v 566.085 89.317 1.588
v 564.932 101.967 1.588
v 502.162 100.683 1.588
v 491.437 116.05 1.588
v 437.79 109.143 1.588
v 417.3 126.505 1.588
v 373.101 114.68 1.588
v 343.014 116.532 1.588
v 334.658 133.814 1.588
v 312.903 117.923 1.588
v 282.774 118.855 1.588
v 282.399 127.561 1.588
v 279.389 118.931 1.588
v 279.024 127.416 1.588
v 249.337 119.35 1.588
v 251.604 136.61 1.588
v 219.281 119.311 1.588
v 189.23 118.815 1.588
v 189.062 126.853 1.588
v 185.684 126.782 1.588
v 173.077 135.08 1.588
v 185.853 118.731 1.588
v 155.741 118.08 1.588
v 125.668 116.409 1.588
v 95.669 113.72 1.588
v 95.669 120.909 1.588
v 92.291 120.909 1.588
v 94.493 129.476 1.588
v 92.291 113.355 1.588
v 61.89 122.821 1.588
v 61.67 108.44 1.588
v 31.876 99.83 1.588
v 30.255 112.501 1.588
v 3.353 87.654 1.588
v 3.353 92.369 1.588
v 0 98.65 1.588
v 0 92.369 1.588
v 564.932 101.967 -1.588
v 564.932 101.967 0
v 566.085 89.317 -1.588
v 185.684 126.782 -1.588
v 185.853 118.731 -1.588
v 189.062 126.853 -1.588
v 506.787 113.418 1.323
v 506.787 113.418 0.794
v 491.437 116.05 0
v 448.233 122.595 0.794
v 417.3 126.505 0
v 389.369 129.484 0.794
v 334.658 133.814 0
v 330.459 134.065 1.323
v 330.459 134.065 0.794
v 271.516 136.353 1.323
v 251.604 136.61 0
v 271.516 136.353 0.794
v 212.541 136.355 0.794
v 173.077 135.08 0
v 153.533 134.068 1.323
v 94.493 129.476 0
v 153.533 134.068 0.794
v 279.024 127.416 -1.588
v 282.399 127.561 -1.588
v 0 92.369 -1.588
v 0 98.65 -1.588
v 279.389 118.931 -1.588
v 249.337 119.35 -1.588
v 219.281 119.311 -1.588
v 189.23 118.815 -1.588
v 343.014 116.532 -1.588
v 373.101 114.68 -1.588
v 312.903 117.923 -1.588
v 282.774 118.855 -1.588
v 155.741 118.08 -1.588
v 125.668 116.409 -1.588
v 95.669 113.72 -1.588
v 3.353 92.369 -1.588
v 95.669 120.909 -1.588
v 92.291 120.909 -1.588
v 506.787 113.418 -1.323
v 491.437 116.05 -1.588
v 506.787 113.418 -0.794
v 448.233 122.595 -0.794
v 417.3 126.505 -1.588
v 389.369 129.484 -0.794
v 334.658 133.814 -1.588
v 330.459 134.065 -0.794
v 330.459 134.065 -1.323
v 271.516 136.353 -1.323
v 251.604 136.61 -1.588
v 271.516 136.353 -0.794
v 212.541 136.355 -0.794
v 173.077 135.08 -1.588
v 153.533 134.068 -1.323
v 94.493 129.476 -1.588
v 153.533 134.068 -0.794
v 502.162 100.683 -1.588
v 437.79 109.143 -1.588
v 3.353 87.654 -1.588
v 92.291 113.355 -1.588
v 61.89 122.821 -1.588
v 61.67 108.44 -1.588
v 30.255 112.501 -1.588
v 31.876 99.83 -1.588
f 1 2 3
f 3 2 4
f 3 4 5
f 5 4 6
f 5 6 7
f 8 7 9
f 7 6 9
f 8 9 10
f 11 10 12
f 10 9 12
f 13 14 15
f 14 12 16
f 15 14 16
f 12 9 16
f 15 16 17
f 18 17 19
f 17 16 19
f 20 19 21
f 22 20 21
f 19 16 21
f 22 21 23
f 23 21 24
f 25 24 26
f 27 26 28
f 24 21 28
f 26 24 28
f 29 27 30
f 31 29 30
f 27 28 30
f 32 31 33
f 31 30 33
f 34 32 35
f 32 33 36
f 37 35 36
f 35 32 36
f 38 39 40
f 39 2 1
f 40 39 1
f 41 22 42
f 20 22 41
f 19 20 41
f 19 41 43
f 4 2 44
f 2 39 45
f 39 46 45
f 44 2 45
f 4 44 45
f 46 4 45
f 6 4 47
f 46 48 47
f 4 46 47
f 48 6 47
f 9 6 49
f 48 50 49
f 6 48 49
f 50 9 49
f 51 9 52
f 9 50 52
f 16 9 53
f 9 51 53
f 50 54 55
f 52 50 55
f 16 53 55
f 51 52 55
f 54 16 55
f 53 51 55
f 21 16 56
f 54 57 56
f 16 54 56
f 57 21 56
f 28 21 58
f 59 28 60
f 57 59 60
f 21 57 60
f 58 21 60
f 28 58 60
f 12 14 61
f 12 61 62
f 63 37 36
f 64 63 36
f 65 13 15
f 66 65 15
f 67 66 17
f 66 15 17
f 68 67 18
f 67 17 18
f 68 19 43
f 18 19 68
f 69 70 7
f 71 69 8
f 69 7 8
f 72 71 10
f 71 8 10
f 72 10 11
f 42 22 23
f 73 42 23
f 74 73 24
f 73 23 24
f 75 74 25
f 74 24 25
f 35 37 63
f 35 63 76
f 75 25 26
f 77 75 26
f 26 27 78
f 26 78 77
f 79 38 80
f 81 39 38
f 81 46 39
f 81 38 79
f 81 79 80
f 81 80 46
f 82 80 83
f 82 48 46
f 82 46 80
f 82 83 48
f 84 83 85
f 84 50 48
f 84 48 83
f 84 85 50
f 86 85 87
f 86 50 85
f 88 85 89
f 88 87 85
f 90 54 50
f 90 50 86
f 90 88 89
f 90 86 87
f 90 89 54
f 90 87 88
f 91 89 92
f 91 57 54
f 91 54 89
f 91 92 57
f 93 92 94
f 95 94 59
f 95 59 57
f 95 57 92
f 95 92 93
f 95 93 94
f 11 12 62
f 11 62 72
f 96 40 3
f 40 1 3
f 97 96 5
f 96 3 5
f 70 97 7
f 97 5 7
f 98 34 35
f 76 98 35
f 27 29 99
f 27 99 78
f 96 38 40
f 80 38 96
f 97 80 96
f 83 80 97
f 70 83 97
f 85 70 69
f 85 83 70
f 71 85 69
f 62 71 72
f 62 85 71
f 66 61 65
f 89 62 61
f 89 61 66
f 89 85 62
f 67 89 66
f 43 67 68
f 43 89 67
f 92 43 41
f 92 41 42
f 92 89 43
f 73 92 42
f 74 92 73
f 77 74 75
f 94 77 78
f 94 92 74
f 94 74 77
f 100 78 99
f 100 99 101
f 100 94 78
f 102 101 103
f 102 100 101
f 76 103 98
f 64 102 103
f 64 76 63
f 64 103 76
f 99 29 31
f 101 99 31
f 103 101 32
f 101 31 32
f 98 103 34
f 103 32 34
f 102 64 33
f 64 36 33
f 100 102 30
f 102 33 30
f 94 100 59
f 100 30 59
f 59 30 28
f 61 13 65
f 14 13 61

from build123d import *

# Parameters (mm, degrees)
BOSS_EXTRUDE1_DEPTH = 1.5875
SKETCH2_W           = 3.3528
SKETCH2_H           = 6.4262
SKETCH2_W_2         = 3.3782
SKETCH2_H_2         = 12.7
CUT_EXTRUDE1_DEPTH  = 583.351362494


with BuildPart() as part:
    # Sketch1 → Boss-Extrude1 (new, symmetric)
    with BuildSketch(Plane.XY):
        with BuildLine():
            Line((0, 98.650251409), (0, 85.942482804))
            ThreePointArc((0, 85.942482804), (44.883725347, 104.075777355), (92.3925, 113.364561093))
            ThreePointArc((92.3925, 113.364561093), (139.073495573, 117.280297245), (185.895946704, 118.731643998))
            ThreePointArc((185.895946704, 118.731643998), (279.546572247, 118.92726657), (373.101055052, 114.68030529))
            ThreePointArc((373.101055052, 114.68030529), (470.024153779, 105.277769076), (566.085246422, 89.31652744))
            Line((566.085246422, 89.31652744), (564.932089986, 101.967475673))
            add(Edge.make_bspline(
                [(564.932089986, 101.967475673), (526.305455218, 110.35905311), (487.405693808, 117.234860687), (438.439550099, 123.934721128), (428.624759847, 125.180263294), (408.998984047, 127.476820047), (399.18472115, 128.528373058), (369.737829992, 131.394440576), (350.101100844, 132.920474645), (291.174630327, 136.353130053), (251.868630305, 137.116022476), (173.213311456, 135.594508668), (133.863993721, 133.310179259), (94.492645692, 129.476109839)],
                knots=[0, 0, 0, 0, 0.25, 0.25, 0.3125, 0.3125, 0.375, 0.375, 0.5, 0.5, 0.75, 0.75, 1, 1, 1, 1], degree=3))
            ThreePointArc((94.492645692, 129.476109839), (45.925545315, 118.111851759), (0, 98.650251409))
        make_face()
    extrude(amount=BOSS_EXTRUDE1_DEPTH, both=True)

    # Sketch2 → Cut-Extrude1 (cut, through all)
    with BuildSketch(Plane.XY.offset(1.5875)):
        with Locations((1.6764, 89.155582804)):
            Rectangle(SKETCH2_W, SKETCH2_H)
        with Locations((93.98, 114.558722781)):
            Rectangle(SKETCH2_W_2, SKETCH2_H_2)
        Polygon((185.684391149, 126.782012482), (189.061851112, 126.852719214), (189.327665893, 114.15550131), (185.950205931, 114.084794578), align=None)
        Polygon((279.023773174, 127.416061043), (282.398848572, 127.561323909), (282.944949573, 114.873070535), (279.569874175, 114.727807668), align=None)
    extrude(amount=-CUT_EXTRUDE1_DEPTH, mode=Mode.SUBTRACT)


solid = part.part
